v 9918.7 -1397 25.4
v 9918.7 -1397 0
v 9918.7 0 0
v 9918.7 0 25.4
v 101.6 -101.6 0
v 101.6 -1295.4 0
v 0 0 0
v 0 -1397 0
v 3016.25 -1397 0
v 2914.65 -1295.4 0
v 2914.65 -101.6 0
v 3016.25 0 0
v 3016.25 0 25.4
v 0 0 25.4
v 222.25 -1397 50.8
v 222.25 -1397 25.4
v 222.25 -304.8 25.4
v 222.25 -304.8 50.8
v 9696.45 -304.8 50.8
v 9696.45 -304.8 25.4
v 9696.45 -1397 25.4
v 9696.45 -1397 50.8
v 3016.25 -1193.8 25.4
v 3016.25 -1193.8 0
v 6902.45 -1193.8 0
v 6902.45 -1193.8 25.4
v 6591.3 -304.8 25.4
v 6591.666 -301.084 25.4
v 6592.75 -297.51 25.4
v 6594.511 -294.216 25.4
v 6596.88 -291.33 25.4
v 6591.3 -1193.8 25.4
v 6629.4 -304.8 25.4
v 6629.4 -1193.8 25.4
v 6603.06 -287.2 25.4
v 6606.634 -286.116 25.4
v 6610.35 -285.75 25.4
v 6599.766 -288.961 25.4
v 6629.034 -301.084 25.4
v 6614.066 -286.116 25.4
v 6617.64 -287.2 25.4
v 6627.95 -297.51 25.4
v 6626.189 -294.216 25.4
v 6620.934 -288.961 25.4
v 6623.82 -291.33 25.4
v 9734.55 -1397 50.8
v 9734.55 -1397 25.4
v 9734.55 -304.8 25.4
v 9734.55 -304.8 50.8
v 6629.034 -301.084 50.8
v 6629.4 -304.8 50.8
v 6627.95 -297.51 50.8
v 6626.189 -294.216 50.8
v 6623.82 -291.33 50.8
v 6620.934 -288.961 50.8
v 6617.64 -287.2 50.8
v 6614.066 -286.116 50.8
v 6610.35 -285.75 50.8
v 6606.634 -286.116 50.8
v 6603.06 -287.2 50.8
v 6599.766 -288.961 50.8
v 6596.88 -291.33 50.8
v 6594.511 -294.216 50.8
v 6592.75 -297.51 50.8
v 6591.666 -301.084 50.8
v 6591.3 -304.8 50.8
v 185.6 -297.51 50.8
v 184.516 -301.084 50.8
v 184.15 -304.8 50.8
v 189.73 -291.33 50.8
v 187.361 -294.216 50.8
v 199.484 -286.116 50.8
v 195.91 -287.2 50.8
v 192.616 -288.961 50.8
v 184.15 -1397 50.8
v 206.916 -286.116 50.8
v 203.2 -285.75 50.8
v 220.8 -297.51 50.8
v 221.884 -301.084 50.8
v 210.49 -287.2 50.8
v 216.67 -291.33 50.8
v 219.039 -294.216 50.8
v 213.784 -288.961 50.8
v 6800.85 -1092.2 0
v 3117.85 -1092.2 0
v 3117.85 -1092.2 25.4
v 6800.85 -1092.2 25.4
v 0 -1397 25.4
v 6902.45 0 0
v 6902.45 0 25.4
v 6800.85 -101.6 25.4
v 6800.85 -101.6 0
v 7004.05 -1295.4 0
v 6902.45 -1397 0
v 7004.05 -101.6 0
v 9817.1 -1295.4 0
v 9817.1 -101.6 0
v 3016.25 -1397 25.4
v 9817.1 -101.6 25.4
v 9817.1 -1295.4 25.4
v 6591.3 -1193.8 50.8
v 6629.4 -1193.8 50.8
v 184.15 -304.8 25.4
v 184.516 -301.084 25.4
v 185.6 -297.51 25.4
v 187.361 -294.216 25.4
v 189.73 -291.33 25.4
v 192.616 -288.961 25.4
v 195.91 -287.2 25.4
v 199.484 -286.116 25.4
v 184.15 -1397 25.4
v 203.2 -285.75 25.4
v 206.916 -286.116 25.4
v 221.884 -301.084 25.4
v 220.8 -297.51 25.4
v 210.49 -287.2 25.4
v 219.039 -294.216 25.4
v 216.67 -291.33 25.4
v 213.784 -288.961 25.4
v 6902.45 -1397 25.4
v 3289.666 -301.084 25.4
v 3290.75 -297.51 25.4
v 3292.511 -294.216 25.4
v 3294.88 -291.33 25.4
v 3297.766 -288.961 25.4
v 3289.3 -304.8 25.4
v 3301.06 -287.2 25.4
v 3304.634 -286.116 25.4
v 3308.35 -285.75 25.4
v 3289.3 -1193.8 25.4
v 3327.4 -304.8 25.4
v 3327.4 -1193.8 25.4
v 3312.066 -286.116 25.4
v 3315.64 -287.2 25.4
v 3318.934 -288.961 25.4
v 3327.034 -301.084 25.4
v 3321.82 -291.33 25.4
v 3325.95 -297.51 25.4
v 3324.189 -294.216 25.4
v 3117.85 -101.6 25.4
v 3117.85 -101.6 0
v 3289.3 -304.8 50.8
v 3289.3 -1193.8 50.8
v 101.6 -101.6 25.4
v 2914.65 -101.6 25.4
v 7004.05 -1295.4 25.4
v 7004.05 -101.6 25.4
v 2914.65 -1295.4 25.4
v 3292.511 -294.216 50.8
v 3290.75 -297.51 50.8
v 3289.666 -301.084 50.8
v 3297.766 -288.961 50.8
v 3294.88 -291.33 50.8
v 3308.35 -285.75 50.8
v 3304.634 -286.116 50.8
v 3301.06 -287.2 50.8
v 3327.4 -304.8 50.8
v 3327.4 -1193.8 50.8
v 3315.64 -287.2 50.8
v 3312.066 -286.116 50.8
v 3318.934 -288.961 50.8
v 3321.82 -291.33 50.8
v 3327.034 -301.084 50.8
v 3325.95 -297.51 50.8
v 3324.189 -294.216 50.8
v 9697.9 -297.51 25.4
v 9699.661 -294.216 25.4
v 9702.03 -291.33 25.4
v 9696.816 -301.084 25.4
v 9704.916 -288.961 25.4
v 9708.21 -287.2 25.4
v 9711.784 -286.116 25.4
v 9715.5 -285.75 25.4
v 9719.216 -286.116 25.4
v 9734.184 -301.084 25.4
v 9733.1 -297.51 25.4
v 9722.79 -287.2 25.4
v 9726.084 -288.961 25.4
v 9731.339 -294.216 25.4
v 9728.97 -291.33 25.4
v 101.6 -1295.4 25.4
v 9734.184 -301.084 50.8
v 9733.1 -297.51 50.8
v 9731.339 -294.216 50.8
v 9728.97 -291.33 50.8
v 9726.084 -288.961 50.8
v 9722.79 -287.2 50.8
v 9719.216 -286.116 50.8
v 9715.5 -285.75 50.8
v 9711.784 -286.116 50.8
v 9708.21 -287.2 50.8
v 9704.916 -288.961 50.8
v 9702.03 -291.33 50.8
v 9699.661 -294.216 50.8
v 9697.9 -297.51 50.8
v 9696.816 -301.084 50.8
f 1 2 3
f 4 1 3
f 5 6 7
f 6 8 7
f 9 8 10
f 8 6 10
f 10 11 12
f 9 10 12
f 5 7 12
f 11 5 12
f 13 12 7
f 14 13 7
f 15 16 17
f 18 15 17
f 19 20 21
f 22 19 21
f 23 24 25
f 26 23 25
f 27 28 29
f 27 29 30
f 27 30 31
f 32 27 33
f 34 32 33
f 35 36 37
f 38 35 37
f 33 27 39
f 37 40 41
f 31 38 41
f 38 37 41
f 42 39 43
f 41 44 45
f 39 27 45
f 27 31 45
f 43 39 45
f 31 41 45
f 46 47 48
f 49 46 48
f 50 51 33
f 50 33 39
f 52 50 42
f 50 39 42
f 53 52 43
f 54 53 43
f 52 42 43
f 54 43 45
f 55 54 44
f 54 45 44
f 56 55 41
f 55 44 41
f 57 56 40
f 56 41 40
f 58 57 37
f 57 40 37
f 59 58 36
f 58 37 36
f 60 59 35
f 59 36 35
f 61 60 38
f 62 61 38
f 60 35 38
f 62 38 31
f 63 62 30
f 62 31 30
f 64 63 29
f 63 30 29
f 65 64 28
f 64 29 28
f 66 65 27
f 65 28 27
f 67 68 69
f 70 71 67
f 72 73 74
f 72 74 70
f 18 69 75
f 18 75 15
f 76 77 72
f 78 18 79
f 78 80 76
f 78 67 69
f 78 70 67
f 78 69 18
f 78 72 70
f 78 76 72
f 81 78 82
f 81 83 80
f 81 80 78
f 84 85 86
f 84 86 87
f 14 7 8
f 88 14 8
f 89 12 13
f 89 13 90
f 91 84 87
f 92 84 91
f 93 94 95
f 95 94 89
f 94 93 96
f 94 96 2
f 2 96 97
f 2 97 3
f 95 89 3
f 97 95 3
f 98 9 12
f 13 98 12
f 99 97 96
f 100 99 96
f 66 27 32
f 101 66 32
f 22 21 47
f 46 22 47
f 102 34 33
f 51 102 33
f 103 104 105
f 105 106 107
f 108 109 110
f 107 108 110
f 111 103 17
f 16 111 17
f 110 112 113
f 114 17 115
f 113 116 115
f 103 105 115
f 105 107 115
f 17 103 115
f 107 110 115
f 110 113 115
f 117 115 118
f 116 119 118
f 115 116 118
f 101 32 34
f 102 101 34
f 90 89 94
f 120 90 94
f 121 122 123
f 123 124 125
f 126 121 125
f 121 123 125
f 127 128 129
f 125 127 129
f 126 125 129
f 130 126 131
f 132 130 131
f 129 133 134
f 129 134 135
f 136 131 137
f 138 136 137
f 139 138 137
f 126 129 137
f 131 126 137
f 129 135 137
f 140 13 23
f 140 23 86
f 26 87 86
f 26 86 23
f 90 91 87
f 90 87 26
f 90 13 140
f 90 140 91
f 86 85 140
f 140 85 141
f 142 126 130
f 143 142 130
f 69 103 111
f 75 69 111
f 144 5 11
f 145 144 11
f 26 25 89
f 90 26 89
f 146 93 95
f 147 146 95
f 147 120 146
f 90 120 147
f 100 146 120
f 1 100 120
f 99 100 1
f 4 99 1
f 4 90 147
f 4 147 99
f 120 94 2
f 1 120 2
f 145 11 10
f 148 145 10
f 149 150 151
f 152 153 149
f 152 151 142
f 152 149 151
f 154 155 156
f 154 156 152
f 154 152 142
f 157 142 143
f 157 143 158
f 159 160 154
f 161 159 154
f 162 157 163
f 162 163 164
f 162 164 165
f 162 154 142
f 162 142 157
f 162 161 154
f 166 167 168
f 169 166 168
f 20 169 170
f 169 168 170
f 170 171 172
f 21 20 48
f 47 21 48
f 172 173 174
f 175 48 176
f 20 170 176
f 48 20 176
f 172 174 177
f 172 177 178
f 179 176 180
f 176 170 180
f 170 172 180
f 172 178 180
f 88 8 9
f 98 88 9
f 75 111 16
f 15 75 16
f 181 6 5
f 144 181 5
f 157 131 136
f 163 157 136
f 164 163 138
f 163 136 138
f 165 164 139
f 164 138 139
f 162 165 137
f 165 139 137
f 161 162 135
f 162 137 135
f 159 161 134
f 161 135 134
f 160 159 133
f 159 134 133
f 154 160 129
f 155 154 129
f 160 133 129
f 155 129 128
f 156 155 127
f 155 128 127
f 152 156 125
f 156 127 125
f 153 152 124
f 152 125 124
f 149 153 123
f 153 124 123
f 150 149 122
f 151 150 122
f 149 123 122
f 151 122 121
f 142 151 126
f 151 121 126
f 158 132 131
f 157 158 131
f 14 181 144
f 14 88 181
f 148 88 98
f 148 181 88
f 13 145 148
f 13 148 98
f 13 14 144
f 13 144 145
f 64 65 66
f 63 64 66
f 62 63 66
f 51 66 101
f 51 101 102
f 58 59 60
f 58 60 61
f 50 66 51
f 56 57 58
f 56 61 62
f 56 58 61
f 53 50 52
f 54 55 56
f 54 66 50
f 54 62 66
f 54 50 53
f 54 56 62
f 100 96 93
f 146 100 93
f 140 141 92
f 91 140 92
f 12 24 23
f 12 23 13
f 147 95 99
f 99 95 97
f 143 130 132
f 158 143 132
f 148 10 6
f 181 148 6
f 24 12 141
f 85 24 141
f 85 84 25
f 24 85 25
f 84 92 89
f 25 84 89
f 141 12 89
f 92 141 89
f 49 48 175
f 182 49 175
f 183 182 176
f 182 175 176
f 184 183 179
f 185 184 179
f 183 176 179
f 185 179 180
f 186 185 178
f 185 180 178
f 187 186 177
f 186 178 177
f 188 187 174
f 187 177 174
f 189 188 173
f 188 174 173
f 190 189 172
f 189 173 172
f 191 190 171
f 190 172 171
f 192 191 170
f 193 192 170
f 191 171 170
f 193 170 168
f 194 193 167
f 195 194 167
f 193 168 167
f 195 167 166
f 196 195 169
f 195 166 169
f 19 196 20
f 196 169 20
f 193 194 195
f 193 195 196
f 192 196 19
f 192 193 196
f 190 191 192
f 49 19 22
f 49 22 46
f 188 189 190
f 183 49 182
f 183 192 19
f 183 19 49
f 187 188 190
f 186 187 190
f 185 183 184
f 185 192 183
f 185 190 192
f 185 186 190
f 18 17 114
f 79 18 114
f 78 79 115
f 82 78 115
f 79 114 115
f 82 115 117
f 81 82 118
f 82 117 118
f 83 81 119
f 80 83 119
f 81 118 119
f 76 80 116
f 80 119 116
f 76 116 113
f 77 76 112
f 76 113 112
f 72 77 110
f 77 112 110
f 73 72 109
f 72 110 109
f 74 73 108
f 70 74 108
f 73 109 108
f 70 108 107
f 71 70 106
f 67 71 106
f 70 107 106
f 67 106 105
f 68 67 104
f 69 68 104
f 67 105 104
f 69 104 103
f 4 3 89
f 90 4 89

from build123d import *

# Parameters (mm, degrees)
F1_DEPTH = 25.4
F0_W     = 3886.2
F0_H     = 1193.8
F0_W_2   = 3683
F0_H_2   = 990.6000024557
F2_DEPTH = 25.4
F3_DEPTH = 25.4
F5_DEPTH = 25.4


with BuildPart() as f1:
    # F0 (on Top) → F1 (new body)
    with BuildSketch(Plane.XY):
        Polygon((3016.25, 0), (0, 0), (0, -1397), (3016.25, -1397), (3016.25, -1193.8), align=None)
        Polygon((2914.6500012279, -1295.4000012279), (101.5999987721, -1295.4000012279), (101.5999987721, -101.5999987721), (2914.6500012279, -101.5999987721), (2914.6500012279, -1092.2000012279), align=None, mode=Mode.SUBTRACT)
    extrude(amount=F1_DEPTH)


with BuildPart() as f2:
    # F0 (on Top) → F2 (new body)
    with BuildSketch(Plane.XY):
        with Locations((4959.35, -596.9)):
            Rectangle(F0_W, F0_H)
        with Locations((4959.35, -596.9)):
            Rectangle(F0_W_2, F0_H_2, mode=Mode.SUBTRACT)
    extrude(amount=F2_DEPTH)


with BuildPart() as f3:
    # F0 (on Top) → F3 (new body)
    with BuildSketch(Plane.XY):
        Polygon((9918.7, 0), (6902.45, 0), (6902.45, -1193.8), (6902.45, -1397), (9918.7, -1397), align=None)
        Polygon((7004.0499987721, -101.5999987721), (9817.1000012279, -101.5999987721), (9817.1000012279, -1295.4000012279), (7004.0499987721, -1295.4000012279), (7004.0499987721, -1092.2000012279), align=None, mode=Mode.SUBTRACT)
    extrude(amount=F3_DEPTH)


with BuildPart() as f5:
    # F4 (on face) → F5 (new body)
    with BuildSketch(Plane.XY.offset(25.4)):
        with BuildLine():
            Line((184.15, -304.8), (184.15, -1397))
            Line((184.15, -1397), (222.25, -1397))
            Line((222.25, -1397), (222.25, -304.8))
            ThreePointArc((222.25, -304.8), (203.2, -323.85), (184.15, -304.8))
        make_face()
        with BuildLine():
            ThreePointArc((222.25, -304.8), (203.2, -285.75), (184.15, -304.8))
            Line((184.15, -304.8), (222.25, -304.8))
        make_face()
        with BuildLine():
            Line((222.25, -304.8), (184.15, -304.8))
            ThreePointArc((184.15, -304.8), (203.2, -323.85), (222.25, -304.8))
        make_face()
    extrude(amount=F5_DEPTH)


with BuildPart() as f5b:
    # F4 (on face) → F5, piece 2 (new body)
    with BuildSketch(Plane.XY.offset(25.4)):
        with BuildLine():
            Line((3289.3, -304.8), (3289.3, -1193.8))
            Line((3289.3, -1193.8), (3327.4, -1193.8))
            Line((3327.4, -1193.8), (3327.4, -304.8))
            ThreePointArc((3327.4, -304.8), (3308.35, -323.85), (3289.3, -304.8))
        make_face()
        with BuildLine():
            ThreePointArc((3327.4, -304.8), (3308.35, -285.75), (3289.3, -304.8))
            Line((3289.3, -304.8), (3327.4, -304.8))
        make_face()
        with BuildLine():
            Line((3327.4, -304.8), (3289.3, -304.8))
            ThreePointArc((3289.3, -304.8), (3308.35, -323.85), (3327.4, -304.8))
        make_face()
    extrude(amount=F5_DEPTH)


with BuildPart() as f5c:
    # F4 (on face) → F5, piece 3 (new body)
    with BuildSketch(Plane.XY.offset(25.4)):
        with BuildLine():
            Line((6591.3, -304.8), (6591.3, -1193.8))
            Line((6591.3, -1193.8), (6629.4, -1193.8))
            Line((6629.4, -1193.8), (6629.4, -304.8))
            ThreePointArc((6629.4, -304.8), (6610.35, -323.85), (6591.3, -304.8))
        make_face()
        with BuildLine():
            ThreePointArc((6629.4, -304.8), (6610.35, -285.75), (6591.3, -304.8))
            Line((6591.3, -304.8), (6629.4, -304.8))
        make_face()
        with BuildLine():
            Line((6629.4, -304.8), (6591.3, -304.8))
            ThreePointArc((6591.3, -304.8), (6610.35, -323.85), (6629.4, -304.8))
        make_face()
    extrude(amount=F5_DEPTH)


with BuildPart() as f5d:
    # F4 (on face) → F5, piece 4 (new body)
    with BuildSketch(Plane.XY.offset(25.4)):
        with BuildLine():
            Line((9696.45, -304.8), (9696.45, -1397))
            Line((9696.45, -1397), (9734.55, -1397))
            Line((9734.55, -1397), (9734.55, -304.8))
            ThreePointArc((9734.55, -304.8), (9715.5, -323.85), (9696.45, -304.8))
        make_face()
        with BuildLine():
            ThreePointArc((9734.55, -304.8), (9715.5, -285.75), (9696.45, -304.8))
            Line((9696.45, -304.8), (9734.55, -304.8))
        make_face()
        with BuildLine():
            Line((9734.55, -304.8), (9696.45, -304.8))
            ThreePointArc((9696.45, -304.8), (9715.5, -323.85), (9734.55, -304.8))
        make_face()
    extrude(amount=F5_DEPTH)


solid = Compound([f1.part, f2.part, f3.part, f5.part, f5b.part, f5c.part, f5d.part])
